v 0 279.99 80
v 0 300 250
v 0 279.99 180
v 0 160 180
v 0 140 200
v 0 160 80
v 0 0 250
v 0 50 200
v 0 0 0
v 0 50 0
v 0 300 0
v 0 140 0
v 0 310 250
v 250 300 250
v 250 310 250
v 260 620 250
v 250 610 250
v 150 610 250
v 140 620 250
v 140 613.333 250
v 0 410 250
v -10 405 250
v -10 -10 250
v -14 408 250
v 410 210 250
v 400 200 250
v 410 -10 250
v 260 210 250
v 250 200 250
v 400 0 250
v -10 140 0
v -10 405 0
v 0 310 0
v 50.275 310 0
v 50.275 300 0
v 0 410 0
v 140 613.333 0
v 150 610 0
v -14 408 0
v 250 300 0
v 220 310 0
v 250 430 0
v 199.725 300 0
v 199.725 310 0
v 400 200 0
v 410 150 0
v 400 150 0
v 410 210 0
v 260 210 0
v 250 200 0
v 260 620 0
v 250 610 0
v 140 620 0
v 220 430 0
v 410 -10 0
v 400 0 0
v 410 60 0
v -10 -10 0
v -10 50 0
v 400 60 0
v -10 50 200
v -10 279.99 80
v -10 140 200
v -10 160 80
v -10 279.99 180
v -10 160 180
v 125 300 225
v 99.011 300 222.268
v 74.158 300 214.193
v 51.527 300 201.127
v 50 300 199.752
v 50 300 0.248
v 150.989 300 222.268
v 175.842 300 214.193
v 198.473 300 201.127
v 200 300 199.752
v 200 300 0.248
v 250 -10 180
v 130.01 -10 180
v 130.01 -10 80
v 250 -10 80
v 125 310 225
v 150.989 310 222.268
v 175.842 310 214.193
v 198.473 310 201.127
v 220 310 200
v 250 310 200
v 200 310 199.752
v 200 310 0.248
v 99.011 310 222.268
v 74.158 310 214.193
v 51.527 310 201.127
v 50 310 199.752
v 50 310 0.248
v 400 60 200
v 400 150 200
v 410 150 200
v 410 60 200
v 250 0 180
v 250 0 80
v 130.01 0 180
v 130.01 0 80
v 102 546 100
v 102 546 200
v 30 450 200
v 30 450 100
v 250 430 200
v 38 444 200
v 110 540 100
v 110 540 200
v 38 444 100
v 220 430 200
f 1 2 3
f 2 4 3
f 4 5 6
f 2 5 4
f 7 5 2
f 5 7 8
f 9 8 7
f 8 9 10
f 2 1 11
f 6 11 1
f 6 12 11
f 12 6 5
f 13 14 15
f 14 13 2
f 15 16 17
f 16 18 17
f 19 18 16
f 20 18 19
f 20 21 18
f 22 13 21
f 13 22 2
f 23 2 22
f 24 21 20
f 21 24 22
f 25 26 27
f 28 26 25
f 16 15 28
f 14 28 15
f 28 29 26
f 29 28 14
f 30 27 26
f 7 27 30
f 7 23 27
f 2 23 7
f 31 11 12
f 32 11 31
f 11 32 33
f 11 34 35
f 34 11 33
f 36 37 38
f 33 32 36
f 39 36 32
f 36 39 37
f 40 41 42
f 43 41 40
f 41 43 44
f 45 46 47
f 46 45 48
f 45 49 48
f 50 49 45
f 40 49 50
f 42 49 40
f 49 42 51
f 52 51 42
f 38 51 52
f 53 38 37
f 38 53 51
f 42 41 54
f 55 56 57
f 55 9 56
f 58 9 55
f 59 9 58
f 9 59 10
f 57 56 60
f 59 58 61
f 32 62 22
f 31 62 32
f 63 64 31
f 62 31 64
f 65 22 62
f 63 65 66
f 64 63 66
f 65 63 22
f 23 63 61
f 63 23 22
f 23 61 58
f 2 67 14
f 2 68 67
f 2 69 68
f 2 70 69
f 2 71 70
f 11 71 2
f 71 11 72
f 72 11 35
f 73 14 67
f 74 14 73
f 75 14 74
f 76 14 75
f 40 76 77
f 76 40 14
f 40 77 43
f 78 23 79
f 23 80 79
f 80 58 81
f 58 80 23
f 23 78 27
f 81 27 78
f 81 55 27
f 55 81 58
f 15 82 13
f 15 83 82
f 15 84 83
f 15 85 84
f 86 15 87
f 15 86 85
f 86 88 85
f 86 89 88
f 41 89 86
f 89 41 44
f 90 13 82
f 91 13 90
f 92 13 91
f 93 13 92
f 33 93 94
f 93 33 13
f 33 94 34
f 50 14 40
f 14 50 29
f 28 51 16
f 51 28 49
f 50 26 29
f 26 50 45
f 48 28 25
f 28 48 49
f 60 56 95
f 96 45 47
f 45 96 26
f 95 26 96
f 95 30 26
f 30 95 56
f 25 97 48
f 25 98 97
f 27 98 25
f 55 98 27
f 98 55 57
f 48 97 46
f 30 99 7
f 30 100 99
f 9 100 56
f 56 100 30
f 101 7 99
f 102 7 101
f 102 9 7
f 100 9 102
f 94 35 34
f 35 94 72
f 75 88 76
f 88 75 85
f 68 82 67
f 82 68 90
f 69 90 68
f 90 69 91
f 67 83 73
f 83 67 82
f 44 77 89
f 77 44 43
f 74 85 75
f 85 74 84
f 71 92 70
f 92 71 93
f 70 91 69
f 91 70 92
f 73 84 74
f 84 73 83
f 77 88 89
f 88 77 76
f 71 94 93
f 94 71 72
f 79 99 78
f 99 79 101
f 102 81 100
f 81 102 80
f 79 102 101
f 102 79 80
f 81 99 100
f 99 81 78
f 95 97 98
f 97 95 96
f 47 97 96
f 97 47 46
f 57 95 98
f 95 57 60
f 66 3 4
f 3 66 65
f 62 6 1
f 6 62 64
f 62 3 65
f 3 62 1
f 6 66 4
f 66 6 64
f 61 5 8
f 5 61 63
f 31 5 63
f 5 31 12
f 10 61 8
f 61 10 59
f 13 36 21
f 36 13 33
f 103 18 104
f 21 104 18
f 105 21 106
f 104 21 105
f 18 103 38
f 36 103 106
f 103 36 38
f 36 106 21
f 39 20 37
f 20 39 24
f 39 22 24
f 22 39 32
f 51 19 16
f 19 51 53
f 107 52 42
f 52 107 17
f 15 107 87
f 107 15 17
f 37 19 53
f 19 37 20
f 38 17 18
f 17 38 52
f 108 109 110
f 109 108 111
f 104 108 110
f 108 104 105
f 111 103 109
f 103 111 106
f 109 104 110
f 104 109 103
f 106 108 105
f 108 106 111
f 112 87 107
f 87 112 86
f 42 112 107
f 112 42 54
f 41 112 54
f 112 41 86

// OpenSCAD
// file: tools.scad
unit="cm";

//Draw reference axis
module drawAxis(s=1){
	rotate([0, 90, 0]) color("Crimson") cylinder(h=s, r1=s/20, r2=s/20, $fn=10);
	rotate([-90, 0, 0]) color("LimeGreen") cylinder(h=s, r1=s/20, r2=s/20, $fn=10);
	color("DodgerBlue") cylinder(h=s, r1=s/20, r2=s/20, $fn=10);
}

// drawAxis(1);
// 
// translate([2, 0, 0]) rotate([0, -45, 0]) drawAxis(1);
// 
// rotate([0, -45, 0]) translate([2, 0, 0]) drawAxis(1);
// main file
include <tools.scad>

//Global variable used to demonstrate the swept_volume
draw_swept_volume=true;

//The walls module work using data structures that need to be built from your wall description.
//The aim is to build the data structures only once (expensive in OpenSCAD langauge), and rely on them in the different modules.
//First fill the variable walls with tuples:
//  - the first element is the measurements of length of the inner face of the wall,
//  - the second element is the angle relative to previous wall (positive means turn to the left)
//  - [optional] the third element is the current-wall thickness, a value of 0 hides the given wall
//  - [optional] the fourth element is the current-wall height
//The description is assumed to specify the inner dimension of the wall, and all placement are relative to the bottom left corner.

//Then build the data structures with the following utilites
function Compute_wall_angle(walls, i) = ((i==0) ? walls[i][1] : walls[i][1] + Compute_wall_angle(walls, i-1));
function Compute_wall_origin(walls, walls_angle, i) = ((i==0) ? [0, 0] : [Compute_wall_origin(walls, walls_angle, i-1)[0] + sin(-walls_angle[i-1]) * walls[i-1][0], Compute_wall_origin(walls, walls_angle, i-1)[1] + cos(-walls_angle[i-1]) * walls[i-1][0]]);
function Compute_wall_end(walls, walls_angle, walls_origin, i) = [ walls_origin[i][0] + sin(-walls_angle[i]) * walls[i][0], walls_origin[i][1] + cos(-walls_angle[i]) * walls[i][0] ];

function Build_walls_angle(walls) = [ for(i = [0:len(walls)-1]) Compute_wall_angle(walls, i) ];
function Build_walls_origin(walls, walls_angle) = [ for(i = [0:len(walls)-1]) Compute_wall_origin(walls, walls_angle, i) ];
function Build_walls_end(walls, walls_angle, walls_origin) = [ for(i = [0:len(walls)-1]) Compute_wall_end(walls, walls_angle, walls_origin, i) ];

//See at the bottom of this file to get an example on how to build the data structures and use the modules

//Draw walls, help visualise the organisation of a room with the furnitures from the other modules
// walls - The tuple list of wall description
// walls_thickness - The default wall thickness (used when the thickness of a given wall is not specified, can be omitted if all the walls are defined)
// walls_height - The default wall height (used when the height of a given wall is not specified, can be omitted if all the walls are defined)
module walls(walls, walls_angle, walls_origin, default_walls_height){
	number_walls=len(walls);
	assert(number_walls>=1, "ERROR: Invalid number of walls");
	assert(len(walls_angle)==number_walls && len(walls_origin)==number_walls, "ERROR: walls_angle or walls_origin is invalid. Please build them using Compute_wall_angles or Compute_wall_origin.");

	for(i=[0:number_walls-1]){
		assert(len(walls[i])>=3 && len(walls[i])<=4, str("ERROR: Invalid wall description. walls[", i, "]=", walls[i], " is not of the form [length, angle, thickness]"));
		
		wall_thickness=walls[i][2];
		
		if(wall_thickness >0){
			previous_wall_thickness=(i==0)? walls[number_walls-1][2] : walls[i-1][2];
			extra_length=(walls[i][1]<=0)? previous_wall_thickness : 0;
			wall_length=walls[i][0] + extra_length;
			wall_height=(len(walls[i])>=4)? walls[i][3] : default_walls_height;
			
			translate(walls_origin[i]) rotate(walls_angle[i]) translate([-wall_thickness, -extra_length]) cube([wall_thickness, wall_length, wall_height]);
		}
	}
}

//Allow to simplify the placement of an object in a room: allow to specify a wall and a transalation relative to this wall origin (bottom left corner)
// walls_angle - Data structure build from walls description, see top of this file
// walls_origin - Data structure build from walls description, see top of this file
// wall_id - The id (or index) of the wall in the walls description (must be in the range [0, len(walls)])
//Usage: this module expects a scope with one or several objects to move to the origin of the wall. To use it properly you should invoke it with the follwoing sequence:
// translate/rotate the room
//   build room (see walls module)
//   translate_on_wall
//     translate/rotate to move the furniture
//       furniture
//See example for room 2 bellow
module translate_on_wall(walls_angle, walls_origin, wall_id){
	assert(len(walls_angle)==len(walls_origin), "ERROR: walls_angle or walls_origin is invalid. Please build them using Compute_wall_angles or Compute_wall_origin.");
	assert(wall_id>=0 && wall_id<len(walls_angle), str("ERROR: invalid wall_id, must be in the range [0, ", (len(walls_angle)-1), "]."));
	
	translate([walls_origin[wall_id][0], walls_origin[wall_id][1], 0]) rotate([0, 0, walls_angle[wall_id]]) children();
}

//Allow to simplify the placement of an object in a room: allow to specify a wall and a transalation relative to this wall end (bottom right corner)
// walls_angle - Data structure build from walls description, see top of this file
// walls_end - Data structure build from walls description, see top of this file
// wall_id - The id (or index) of the wall in the walls description (must be in the range [0, len(walls)])
//See translate_on_wall
module translate_on_wall_end(walls_angle, walls_end, wall_id){
	assert(len(walls_angle)==len(walls_end), "ERROR: walls_angle or walls_end is invalid. Please build them using Compute_wall_angles or Compute_wall_origin.");
	assert(wall_id>=0 && wall_id<len(walls_angle), str("ERROR: invalid wall_id, must be in the range [0, ", (len(walls_angle)-1), "]."));
	
	translate([walls_end[wall_id][0], walls_end[wall_id][1], 0]) rotate([0, 0, walls_angle[wall_id]]) children();
}

//Create a fixed opening (door/window)
// walls - The tuple list of wall description
// walls_angle - Data structure build from walls description, see top of this file
// walls_origin - Data structure build from walls description, see top of this file
// wall_id - The id (or index) of the wall in the walls description (must be in the range [0, len(walls)])
// offset - Translation on the wall for the opening, must be expressed as a position on the wall (from its left bottom corner) (vec2)
// shape - Dimensions of the opening expressed as [width, height]
module create_fixed_opening(walls, walls_angle, walls_origin, wall_id, offset, shape){
	assert(len(shape)==2, "ERROR: the shape is expected as a pair [width, height].");

	wall_thickness=walls[wall_id][2];
	
	create_custom_opening(walls, walls_angle, walls_origin, wall_id, offset){
		children();
		
		cube([3*wall_thickness, shape[0], shape[1]]);
	}
}

//Create a single panel opening (door/window), with its swept volume
// walls - The tuple list of wall description
// walls_angle - Data structure build from walls description, see top of this file
// walls_origin - Data structure build from walls description, see top of this file
// wall_id - The id (or index) of the wall in the walls description (must be in the range [0, len(walls)])
// offset - Translation on the wall for the opening, must be expressed as a position on the wall (from its left bottom corner) (vec2)
// shape - Dimensions of the opening expressed as [width, height]
// draw_swept_volume - [optional] Draw the volume swept by the opening panel (door panel, window panel, ...)
//   swept_direction_inside - The direction of the panel, true=the panel moves toward the inside, false=the panel moves toward the outside
//   swept_side_left - The side for the panel hinges (seen from the inside of the room), true=hinges on the left side, false=hinges on the right side
//    swept_angle - Angle swept by the panel
module create_panel_opening(walls, walls_angle, walls_origin, wall_id, offset, shape, draw_swept_volume=true, swept_direction_inside=true, swept_side_left=true, swept_angle=90){
	assert(len(shape)==2, "ERROR: the shape is expected as a pair [width, height].");
	
	wall_thickness=walls[wall_id][2];
	
	create_custom_opening(walls, walls_angle, walls_origin, wall_id, offset){
		children();
		
		cube([3*wall_thickness, shape[0], shape[1]]);
		
		if(draw_swept_volume==true){
			swept_offset_direction=(swept_direction_inside==true)?1.5*wall_thickness:0.5*wall_thickness;
			swept_offest_side=(swept_side_left==true)?0:shape[0];
			# translate([swept_offset_direction, swept_offest_side, 0]) difference(){
			cylinder(r=shape[0], h=shape[1]);
			//Remove appropriate side
			translate([(swept_direction_inside==true)?-2*shape[0]:0, -2*shape[0], -0.5*shape[1]]) cube([2*shape[0], 4*shape[0], 2*shape[1]]);
			//Remove back (depending of swept_angle)
			rotate([0, 0, (swept_side_left==true && swept_direction_inside==true || swept_side_left==false && swept_direction_inside==false)?-swept_angle:swept_angle])
			translate([(swept_direction_inside==true)?0:-2*shape[0], -2*shape[0], -0.5*shape[1]])
			cube([2*shape[0], 4*shape[0], 2*shape[1]]);
			}
		}
	}
}

//Create a two-panel opening (door/window), with their swept volumes
module create_double_panel_opening(walls, walls_angle, walls_origin, wall_id, offset, shape, draw_swept_volume=true, swept_direction_inside=true, left_panel_width=0.5, swept_angle_left=90, swept_angle_right=90){
	left_panel_size=(left_panel_width<=1)?shape[0]*left_panel_width:left_panel_width;
	
	create_panel_opening(walls, walls_angle, walls_origin, wall_id, offset, [left_panel_size, shape[1]], draw_swept_volume, swept_direction_inside, swept_side_left=true, swept_angle=swept_angle_left)
	//The '0.001' in the offset is there only to offer nicer rendering
	create_panel_opening(walls, walls_angle, walls_origin, wall_id, [offset[0]+left_panel_size-0.01, offset[1]], [shape[0]-left_panel_size, shape[1]], draw_swept_volume, swept_direction_inside, swept_side_left=false, swept_angle=swept_angle_right)
	children();
}

//Create custom opening
//Will cut the given volume(s) from the provided walls. Expect at least to children, the first is the set of walls to remove the openings (all the other children). See usage below.
// walls - The tuple list of wall description
// walls_angle - Data structure build from walls description, see top of this file
// walls_origin - Data structure build from walls description, see top of this file
// wall_id - The id (or index) of the wall in the walls description (must be in the range [0, len(walls)])
// offset - Translation on the wall for the opening, must be expressed as a position on the wall (from its left bottom corner) (vec2)
//
//Important: The actual offest applied to the shape is a combination of the offset provided and a recess movement of 1.5*wall_thickness (to ease the opening operation). The opening shape should be 3*wall_thickness.
//
//Usage:
//  create_custom_opening(...){
//    walls()
//    opening_shape(s)
//  }
module create_custom_opening(walls, walls_angle, walls_origin, wall_id, offset){
	assert(len(walls)==len(walls_angle) && len(walls)==len(walls_origin), "ERROR: walls_angle or walls_origin is invalid. Please build them using Compute_wall_angles or Compute_wall_origin.");
	assert(wall_id>=0 && wall_id<len(walls_angle), str("ERROR: invalid wall_id, must be in the range [0, ", (len(walls)-1), "]."));
	assert(len(offset)==2, "ERROR: the offset is expected as a translation along the wall and an height.");
	
	assert($children>=2, "ERROR: this module expects at least two children.");

	wall_thickness=walls[wall_id][2];
	difference(){
		children(0);
		
		translate_on_wall(walls_angle, walls_origin, wall_id){
			translate([-1.5*wall_thickness, offset[0], offset[1]]){
				children([1:$children-1]);
			}
		}
	}
}



//SAMPLE SECTION
//===============================

//Declare the Room1 walls
walls_room1=[[300, 0, 10], [250, -90, 10], [100, -90, 10], [150, 90, 10], [200, -90, 10], [400, -90, 10]];
//Build the data structures
walls_angle_room1 = Build_walls_angle(walls_room1);
walls_origin_room1 = Build_walls_origin(walls_room1, walls_angle_room1);
walls_end_room1 = Build_walls_end(walls_room1, walls_angle_room1, walls_origin_room1);

//Build the room
//Create a door
create_fixed_opening(walls_room1, walls_angle_room1, walls_origin_room1, wall_id=0, offset=[50, 0], shape=[90, 200])
//Create a double-panel window
create_double_panel_opening(walls_room1, walls_angle_room1, walls_origin_room1, wall_id=0, offset=[160, 80], shape=[120, 100], draw_swept_volume=draw_swept_volume, left_panel_width=0.4)
//Create a door
create_panel_opening(walls_room1, walls_angle_room1, walls_origin_room1, wall_id=4, offset=[50, 0], shape=[90, 200], draw_swept_volume=draw_swept_volume)
//Create a double-panel window
create_double_panel_opening(walls_room1, walls_angle_room1, walls_origin_room1, wall_id=5, offset=[150, 80], shape=[120, 100], draw_swept_volume=draw_swept_volume, left_panel_width=70)
//Create an arch between the two rooms
create_custom_opening(walls_room1, walls_angle_room1, walls_origin_room1, wall_id=1, offset=[0, 0]){
	color("Gray") walls(walls_room1, walls_angle_room1, walls_origin_room1, default_walls_height=250);
	intersection(){
		translate([0, 125, 100]) rotate([0, 90, 0]) cylinder(h=30, d=250);
		translate([0, 50, 0]) cube([30, 150, 250]);
	}
}

//Declare the Room2 walls
walls_room2=[[250, 0, 0], [100, -90, 10], [250, -acos(4/5), 10], [100, -acos(3/5), 10], [300, -90, 10]];
//Build the data structures
walls_angle_room2 = Build_walls_angle(walls_room2);
walls_origin_room2 = Build_walls_origin(walls_room2, walls_angle_room2);
walls_end_room2 = Build_walls_end(walls_room2, walls_angle_room2, walls_origin_room2);

//Build the Room2 and place an "object" relative to one of its walls
//Move the new room and all its furnitures, place it next to room 1
translate([250, 300+10, 0]) rotate([0, 0, 90]) {
	color("Gray") walls(walls_room2, walls_angle_room2, walls_origin_room2, default_walls_height=250);

	translate_on_wall(walls_angle_room2, walls_origin_room2, wall_id=2){ //Move the object (and its translate/rotate operations to the appropriate wall
		translate([0, 50, 100]){ //Move the object/piece of furniture relative to the wall origin
			cube([10, 120, 100]);
		}
	}
	
	translate_on_wall_end(walls_angle_room2, walls_end_room2, wall_id=4){ //Move the object (and its translate/rotate operations to the appropriate wall
		translate([0, -120, 0]){ //Move the object/piece of furniture relative to the wall origin
			cube([30, 120, 200]);
		}
	}
}



//Proposed workflow
//
// Step 1 - Create the walls
//--------------------------
// Create a wall list, use the data-structures builder and the 'walls' module to place the walls.
// You can start by a single wall, and add them one by one.
//
// Sample - Step 1
//    walls=[[wall1_length, wall1_angle, wall1_thickness], [wall2... ], ...]
//    walls_angle = Build_walls_angle(walls);
//    walls_origin = Build_walls_origin(walls, walls_angle);
//    walls_end = Build_walls_end(walls, walls_angle, walls_origin);
//
//    walls(walls, walls_angle, walls_origin, default_walls_height=250);
//
// Customise the walls until you are happy.
//
// Step 2 - Place the opening
//---------------------------
// Again, one by one, add line above the 'walls' module to create the different openings
//
// Sample - Step 2
//    walls=... (and walls_angle, walls_origin, walls_end)
//
// +  create_fixed_opening(walls, walls_angle, walls_origin, <wall_id>, [<offset on wall>, <height>], [<width>, <height>])
// +  create_fixed_opening(walls, walls_angle, walls_origin, <wall_id_bis>, [<offset on wall bis>, <height bis>], [<width bis>, <height bis>])
//    walls(walls, walls_angle, walls_origin, default_walls_height=250);
//
//N.B. Please note that the "create_..._opening()" do not have a ';' at the end of the line, since they are meant to stack with the wall.
//
// Step 3 - Place the furniture
//-----------------------------
// Place the furniture in the newly created room.
//
// Sample - Step 3
//    walls=... (and walls_angle, walls_origin, walls_end)
//
//    create_fixed_opening(walls, walls_angle, walls_origin, <wall_id>, [<offset on wall>, <height>], [<width>, <height>])
//    create_fixed_opening(walls, walls_angle, walls_origin, <wall_id_bis>, [<offset on wall bis>, <height bis>], [<width bis>, <height bis>])
//    walls(walls, walls_angle, walls_origin, default_walls_height=250);
//
// +  translate_on_wall(walls_angle, walls_origin, wall_id){
// +     ... The furniture on wall 'wall_id', they can be moved around on the wall with translate operation (relative to the bottom left corner)
// +     translate([...]) rotate([...]) ...piece_of_furniture...
// +     translate([...]) rotate([...]) ...other_piece_of_furniture...
// +  }
//
// +  translate_on_wall(walls_angle, walls_origin, wall_id_bis){
// +     ... Place furniture on wall_id_bis
// +  }
//
// Step 4 - Place the room
//------------------------
// Now that the room is ready, place it relative to other rooms.
//
// Sample - Step 4
//    walls=... (and walls_angle, walls_origin, walls_end)
//
// +  translate([...]) rotate([...]) {
//      create_fixed_opening(walls, walls_angle, walls_origin, <wall_id>, [<offset on wall>, <height>], [<width>, <height>])
//      create_fixed_opening(walls, walls_angle, walls_origin, <wall_id_bis>, [<offset on wall bis>, <height bis>], [<width bis>, <height bis>])
//      walls(walls, walls_angle, walls_origin, default_walls_height=250);
//
//      translate_on_wall(walls_angle, walls_origin, wall_id){
//         ... Place furntiure on wall_id
//      }
//
//      translate_on_wall(walls_angle, walls_origin, wall_id_bis){
//         ... Place furniture on wall_id_bis
//      }
// +  }
//
// Now you can repeat the process for all the other rooms
